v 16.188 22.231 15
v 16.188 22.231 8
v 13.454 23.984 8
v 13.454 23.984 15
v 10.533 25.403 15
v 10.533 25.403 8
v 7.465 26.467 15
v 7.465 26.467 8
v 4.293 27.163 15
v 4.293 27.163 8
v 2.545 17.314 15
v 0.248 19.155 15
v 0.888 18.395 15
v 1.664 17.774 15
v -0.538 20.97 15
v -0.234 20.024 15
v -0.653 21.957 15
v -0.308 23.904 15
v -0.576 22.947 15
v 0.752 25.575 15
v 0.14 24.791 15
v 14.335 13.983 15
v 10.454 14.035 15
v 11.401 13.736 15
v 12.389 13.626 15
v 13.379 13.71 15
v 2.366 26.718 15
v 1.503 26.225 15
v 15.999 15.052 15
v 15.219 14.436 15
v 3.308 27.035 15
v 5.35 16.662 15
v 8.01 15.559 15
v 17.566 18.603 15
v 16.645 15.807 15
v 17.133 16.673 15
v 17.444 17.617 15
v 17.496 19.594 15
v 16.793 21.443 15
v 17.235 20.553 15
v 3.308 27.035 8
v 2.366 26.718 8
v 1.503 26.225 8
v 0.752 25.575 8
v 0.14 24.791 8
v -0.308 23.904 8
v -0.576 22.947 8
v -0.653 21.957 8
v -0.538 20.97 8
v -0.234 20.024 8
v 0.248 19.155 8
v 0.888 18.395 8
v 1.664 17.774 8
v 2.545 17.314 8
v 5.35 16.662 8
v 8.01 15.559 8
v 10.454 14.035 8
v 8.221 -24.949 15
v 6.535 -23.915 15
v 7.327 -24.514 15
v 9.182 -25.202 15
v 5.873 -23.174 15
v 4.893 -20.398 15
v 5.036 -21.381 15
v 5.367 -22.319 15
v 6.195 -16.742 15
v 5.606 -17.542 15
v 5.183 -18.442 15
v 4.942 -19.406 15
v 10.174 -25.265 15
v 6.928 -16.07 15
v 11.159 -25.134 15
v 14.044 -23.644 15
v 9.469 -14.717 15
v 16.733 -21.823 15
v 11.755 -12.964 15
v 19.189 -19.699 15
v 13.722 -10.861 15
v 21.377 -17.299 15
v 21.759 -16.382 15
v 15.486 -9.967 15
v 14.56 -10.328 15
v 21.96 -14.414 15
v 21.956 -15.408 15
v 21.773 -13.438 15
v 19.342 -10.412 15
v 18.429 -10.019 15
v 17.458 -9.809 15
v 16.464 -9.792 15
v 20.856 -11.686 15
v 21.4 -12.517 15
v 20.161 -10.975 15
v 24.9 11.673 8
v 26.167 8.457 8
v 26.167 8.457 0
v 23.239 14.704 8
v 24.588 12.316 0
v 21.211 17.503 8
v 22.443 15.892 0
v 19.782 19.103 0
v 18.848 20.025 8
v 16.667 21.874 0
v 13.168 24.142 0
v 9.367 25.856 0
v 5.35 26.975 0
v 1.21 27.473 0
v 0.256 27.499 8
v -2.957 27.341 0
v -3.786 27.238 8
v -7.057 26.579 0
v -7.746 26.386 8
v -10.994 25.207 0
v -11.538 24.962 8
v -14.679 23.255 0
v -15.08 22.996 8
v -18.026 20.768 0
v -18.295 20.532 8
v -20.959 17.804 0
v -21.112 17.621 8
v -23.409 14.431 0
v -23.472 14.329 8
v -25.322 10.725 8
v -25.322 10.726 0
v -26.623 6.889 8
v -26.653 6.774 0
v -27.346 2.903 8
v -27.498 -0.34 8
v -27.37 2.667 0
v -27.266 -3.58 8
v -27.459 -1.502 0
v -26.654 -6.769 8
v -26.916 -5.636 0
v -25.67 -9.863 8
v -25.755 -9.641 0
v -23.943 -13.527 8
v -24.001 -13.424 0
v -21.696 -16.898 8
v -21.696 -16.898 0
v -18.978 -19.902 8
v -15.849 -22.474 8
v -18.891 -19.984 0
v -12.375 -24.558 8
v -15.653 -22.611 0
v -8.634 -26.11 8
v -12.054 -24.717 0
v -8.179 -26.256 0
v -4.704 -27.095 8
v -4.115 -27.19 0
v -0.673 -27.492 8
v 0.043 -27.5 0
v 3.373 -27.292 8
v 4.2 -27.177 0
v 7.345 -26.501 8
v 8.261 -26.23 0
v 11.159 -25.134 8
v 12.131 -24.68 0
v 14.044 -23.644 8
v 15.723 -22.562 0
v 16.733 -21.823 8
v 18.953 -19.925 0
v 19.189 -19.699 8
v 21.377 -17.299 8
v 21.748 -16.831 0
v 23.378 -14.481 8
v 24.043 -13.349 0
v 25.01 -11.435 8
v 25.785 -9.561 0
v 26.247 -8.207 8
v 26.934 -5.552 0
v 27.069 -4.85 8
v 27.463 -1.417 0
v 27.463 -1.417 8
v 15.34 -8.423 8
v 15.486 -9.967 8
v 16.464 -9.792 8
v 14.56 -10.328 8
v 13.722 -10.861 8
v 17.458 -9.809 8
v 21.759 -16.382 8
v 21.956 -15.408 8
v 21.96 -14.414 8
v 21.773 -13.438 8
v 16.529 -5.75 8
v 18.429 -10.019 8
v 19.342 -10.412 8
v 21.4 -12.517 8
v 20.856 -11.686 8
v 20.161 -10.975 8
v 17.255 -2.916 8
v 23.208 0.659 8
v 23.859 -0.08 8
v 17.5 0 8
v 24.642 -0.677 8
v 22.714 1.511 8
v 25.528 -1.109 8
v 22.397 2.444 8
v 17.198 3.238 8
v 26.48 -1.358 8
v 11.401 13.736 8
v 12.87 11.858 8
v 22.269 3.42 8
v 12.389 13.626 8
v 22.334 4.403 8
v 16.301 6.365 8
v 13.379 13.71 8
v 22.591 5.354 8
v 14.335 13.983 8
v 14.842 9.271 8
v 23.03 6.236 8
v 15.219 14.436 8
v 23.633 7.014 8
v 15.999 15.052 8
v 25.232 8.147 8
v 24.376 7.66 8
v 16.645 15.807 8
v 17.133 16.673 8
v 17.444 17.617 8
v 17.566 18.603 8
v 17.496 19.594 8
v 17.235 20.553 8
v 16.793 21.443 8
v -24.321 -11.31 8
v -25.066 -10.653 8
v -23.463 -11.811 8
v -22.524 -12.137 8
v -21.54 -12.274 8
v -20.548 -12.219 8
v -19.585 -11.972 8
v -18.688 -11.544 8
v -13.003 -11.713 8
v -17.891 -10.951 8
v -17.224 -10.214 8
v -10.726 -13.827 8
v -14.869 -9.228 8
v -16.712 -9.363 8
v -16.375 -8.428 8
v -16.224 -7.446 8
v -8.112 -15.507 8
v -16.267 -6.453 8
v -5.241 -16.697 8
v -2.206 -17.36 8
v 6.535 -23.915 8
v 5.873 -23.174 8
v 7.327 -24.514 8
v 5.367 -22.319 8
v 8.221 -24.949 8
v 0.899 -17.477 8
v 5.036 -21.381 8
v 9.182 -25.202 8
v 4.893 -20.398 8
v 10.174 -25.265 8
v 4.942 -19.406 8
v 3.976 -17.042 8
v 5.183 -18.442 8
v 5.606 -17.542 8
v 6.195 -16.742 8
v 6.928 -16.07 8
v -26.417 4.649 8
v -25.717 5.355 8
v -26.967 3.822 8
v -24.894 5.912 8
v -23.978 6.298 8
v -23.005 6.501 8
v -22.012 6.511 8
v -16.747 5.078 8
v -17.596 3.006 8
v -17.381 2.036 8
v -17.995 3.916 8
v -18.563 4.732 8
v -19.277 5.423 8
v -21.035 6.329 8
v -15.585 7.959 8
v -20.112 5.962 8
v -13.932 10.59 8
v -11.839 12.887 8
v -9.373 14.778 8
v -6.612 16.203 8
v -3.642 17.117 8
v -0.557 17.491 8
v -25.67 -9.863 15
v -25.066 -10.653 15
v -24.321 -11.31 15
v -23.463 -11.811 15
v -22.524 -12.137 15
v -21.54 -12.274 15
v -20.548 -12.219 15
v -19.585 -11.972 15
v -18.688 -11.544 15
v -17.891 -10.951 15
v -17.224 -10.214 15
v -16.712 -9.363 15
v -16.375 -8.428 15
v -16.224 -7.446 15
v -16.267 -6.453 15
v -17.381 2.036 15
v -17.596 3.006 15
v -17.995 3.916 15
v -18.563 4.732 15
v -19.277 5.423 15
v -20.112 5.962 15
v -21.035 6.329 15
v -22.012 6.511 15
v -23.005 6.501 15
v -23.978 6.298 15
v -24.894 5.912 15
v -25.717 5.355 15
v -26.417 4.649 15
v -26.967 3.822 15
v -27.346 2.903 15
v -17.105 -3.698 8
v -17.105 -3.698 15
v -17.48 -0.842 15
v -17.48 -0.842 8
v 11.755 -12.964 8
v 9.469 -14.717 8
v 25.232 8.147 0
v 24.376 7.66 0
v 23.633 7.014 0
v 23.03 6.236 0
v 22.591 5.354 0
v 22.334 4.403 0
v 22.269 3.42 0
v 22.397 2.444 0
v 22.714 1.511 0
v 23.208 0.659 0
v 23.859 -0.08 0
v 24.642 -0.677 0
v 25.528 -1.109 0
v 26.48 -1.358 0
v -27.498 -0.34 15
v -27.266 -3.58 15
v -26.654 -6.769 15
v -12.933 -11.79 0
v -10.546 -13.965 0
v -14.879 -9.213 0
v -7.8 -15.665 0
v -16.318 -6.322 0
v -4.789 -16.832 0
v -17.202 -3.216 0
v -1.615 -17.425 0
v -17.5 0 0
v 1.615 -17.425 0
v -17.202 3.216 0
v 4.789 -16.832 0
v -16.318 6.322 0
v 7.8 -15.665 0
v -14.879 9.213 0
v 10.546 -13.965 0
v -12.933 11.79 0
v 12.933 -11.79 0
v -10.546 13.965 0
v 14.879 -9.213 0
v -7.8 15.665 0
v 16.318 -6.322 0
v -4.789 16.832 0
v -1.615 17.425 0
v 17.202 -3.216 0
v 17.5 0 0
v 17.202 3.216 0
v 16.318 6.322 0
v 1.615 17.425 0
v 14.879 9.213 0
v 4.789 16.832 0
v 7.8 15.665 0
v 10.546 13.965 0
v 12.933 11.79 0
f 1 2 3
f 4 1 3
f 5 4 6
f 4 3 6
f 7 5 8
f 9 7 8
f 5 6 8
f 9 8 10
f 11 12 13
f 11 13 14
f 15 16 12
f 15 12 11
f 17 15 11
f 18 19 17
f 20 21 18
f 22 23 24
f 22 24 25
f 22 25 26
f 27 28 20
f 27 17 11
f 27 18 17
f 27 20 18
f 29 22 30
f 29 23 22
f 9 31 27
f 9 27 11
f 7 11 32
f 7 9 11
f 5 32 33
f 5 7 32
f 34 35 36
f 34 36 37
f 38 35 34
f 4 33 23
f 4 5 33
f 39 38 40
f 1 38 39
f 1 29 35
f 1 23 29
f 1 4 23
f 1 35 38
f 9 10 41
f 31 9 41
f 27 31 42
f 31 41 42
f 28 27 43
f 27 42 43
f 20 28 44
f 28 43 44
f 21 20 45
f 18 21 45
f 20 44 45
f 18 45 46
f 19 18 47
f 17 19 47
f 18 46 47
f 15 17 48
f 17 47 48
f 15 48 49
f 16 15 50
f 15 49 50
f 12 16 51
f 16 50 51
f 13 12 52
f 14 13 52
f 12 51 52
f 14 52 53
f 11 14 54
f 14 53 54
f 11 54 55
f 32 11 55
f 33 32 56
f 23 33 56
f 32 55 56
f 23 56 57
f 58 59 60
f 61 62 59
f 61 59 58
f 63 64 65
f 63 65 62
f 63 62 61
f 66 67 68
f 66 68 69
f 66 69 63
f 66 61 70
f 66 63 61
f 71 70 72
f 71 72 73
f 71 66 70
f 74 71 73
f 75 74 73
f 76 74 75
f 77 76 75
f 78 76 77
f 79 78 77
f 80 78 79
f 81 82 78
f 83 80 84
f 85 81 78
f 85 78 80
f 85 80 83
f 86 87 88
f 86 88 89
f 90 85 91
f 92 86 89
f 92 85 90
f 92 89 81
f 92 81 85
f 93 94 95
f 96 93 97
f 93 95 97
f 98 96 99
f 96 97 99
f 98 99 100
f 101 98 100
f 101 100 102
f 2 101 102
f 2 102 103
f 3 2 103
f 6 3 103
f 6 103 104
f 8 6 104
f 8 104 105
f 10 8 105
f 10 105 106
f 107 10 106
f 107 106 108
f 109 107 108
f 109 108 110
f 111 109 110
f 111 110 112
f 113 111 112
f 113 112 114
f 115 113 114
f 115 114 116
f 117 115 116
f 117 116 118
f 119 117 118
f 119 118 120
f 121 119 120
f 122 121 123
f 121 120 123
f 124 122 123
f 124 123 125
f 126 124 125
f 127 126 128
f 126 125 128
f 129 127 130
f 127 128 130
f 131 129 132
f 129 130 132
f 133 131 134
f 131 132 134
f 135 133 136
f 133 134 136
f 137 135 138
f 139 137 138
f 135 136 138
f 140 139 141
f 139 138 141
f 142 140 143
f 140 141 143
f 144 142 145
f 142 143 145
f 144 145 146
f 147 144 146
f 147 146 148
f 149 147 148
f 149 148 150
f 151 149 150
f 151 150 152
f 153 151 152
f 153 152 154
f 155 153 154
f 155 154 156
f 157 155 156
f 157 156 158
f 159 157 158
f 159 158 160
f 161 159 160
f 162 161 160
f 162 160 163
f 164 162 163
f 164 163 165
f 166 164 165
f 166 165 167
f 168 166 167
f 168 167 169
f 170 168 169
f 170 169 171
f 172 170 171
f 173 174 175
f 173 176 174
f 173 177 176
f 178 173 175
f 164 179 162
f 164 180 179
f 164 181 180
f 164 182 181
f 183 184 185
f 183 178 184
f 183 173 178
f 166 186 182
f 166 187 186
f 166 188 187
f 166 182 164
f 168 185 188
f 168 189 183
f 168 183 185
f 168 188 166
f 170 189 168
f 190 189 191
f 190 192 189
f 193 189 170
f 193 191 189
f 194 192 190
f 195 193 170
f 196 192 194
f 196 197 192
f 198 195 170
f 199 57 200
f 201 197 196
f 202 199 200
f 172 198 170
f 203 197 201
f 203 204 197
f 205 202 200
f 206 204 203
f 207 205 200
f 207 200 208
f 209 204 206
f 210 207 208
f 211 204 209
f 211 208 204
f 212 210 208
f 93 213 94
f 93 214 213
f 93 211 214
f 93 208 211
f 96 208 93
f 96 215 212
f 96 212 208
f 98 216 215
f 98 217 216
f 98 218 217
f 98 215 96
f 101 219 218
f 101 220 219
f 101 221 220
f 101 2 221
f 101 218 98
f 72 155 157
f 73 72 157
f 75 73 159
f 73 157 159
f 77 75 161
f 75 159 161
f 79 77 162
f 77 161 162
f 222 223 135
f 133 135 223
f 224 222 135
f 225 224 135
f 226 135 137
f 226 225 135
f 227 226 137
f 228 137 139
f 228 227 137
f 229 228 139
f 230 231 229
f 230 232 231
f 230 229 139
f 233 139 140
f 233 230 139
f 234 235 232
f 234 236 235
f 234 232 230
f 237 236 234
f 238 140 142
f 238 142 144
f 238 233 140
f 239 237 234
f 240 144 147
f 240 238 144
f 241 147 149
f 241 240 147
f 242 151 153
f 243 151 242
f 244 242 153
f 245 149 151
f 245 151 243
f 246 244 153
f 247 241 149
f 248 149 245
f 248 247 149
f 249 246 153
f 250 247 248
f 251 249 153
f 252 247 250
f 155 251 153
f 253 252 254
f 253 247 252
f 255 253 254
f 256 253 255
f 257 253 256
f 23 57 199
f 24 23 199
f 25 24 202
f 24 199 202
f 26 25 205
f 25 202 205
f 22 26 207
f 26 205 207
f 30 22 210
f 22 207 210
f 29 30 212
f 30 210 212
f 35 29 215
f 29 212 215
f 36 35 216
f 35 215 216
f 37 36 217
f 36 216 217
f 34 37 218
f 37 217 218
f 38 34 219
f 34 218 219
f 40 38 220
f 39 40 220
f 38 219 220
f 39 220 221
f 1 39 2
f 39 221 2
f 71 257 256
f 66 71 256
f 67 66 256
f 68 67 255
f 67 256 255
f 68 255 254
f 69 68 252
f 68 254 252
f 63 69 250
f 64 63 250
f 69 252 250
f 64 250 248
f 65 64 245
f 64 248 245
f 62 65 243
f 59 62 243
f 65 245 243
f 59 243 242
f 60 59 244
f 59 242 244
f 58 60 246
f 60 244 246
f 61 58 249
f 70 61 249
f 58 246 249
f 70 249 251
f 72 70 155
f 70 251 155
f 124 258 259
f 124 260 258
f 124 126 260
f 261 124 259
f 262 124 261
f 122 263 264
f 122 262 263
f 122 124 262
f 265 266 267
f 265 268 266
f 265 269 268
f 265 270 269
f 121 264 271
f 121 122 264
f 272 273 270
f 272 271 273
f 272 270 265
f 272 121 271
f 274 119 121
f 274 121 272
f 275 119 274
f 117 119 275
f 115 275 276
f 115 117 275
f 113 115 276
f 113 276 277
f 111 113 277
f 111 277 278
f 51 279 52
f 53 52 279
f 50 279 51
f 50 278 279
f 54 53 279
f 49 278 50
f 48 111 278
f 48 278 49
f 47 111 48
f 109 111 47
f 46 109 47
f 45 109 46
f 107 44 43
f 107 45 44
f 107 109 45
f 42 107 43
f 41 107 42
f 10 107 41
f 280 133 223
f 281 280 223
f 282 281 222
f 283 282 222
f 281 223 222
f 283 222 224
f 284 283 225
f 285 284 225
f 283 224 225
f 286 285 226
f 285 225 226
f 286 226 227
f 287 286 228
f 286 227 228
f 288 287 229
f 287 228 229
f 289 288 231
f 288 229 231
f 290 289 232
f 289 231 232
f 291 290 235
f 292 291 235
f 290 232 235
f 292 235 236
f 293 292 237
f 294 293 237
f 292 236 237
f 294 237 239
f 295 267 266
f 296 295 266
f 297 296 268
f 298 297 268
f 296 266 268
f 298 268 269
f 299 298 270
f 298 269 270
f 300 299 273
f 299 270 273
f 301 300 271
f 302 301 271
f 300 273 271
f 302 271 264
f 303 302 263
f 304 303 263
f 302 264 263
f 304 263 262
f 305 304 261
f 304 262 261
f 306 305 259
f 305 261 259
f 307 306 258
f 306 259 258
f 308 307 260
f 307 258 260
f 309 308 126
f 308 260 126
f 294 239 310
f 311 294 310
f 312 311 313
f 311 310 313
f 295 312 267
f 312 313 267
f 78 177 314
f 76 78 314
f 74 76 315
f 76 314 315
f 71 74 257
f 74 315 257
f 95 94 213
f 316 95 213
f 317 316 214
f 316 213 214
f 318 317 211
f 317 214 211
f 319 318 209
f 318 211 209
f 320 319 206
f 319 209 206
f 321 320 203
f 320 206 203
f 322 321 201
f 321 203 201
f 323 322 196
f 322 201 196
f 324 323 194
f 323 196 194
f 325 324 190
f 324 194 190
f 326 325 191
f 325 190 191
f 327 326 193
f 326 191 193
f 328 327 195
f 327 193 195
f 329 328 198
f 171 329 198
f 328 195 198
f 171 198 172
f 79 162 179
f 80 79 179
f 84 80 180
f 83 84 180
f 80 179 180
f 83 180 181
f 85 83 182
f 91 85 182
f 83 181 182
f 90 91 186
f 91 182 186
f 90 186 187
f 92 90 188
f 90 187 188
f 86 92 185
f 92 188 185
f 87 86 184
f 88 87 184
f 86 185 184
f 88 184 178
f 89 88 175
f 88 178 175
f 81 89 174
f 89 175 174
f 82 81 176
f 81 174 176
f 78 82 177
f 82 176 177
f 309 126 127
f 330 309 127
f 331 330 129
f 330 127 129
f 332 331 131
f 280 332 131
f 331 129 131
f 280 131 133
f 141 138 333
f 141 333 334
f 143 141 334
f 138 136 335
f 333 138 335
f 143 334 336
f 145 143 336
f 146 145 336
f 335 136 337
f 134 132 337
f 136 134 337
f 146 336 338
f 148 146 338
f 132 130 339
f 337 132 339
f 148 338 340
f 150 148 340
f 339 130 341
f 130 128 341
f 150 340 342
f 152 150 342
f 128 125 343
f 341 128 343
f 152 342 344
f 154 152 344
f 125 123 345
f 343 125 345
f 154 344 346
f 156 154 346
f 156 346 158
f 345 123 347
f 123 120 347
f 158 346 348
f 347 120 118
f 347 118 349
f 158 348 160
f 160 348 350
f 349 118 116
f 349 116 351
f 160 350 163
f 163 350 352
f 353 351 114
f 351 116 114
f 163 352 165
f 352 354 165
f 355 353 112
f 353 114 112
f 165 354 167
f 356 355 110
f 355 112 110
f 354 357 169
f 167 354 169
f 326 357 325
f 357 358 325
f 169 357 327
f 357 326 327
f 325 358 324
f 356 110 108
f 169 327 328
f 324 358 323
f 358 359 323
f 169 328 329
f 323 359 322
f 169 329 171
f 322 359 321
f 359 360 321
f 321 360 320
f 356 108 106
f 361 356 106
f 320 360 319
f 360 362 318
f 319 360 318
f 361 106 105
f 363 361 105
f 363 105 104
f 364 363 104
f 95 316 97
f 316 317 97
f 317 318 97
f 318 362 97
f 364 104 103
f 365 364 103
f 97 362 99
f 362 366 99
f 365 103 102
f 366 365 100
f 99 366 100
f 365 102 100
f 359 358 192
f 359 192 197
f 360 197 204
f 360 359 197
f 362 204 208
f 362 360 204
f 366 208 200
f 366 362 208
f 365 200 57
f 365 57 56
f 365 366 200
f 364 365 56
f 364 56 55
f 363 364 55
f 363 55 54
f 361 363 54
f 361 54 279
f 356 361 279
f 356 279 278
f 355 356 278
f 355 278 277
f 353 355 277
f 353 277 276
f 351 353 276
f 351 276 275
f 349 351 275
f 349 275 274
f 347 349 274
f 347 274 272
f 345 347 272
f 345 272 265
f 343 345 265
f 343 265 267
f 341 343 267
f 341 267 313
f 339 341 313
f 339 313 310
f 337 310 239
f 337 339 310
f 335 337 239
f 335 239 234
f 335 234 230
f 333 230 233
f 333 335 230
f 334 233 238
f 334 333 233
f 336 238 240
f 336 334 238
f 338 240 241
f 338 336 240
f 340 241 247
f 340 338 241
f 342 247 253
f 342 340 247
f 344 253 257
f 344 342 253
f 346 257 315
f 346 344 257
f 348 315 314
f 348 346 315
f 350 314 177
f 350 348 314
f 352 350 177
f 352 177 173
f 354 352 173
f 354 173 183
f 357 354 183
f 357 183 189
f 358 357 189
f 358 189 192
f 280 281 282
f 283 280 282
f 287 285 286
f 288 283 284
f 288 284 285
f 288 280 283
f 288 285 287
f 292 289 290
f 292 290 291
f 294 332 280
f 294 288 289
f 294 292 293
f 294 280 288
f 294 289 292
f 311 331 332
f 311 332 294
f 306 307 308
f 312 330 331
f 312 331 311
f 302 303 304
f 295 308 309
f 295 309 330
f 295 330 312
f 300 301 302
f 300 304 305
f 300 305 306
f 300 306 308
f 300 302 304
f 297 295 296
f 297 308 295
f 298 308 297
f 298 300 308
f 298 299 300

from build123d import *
from build123d.topology import SkipClean

# Parameters (mm, degrees)
SKETCH1_R           = 27.5
SKETCH1_R_2         = 17.5
BOSS_EXTRUDE1_DEPTH = 8
BOSS_EXTRUDE2_DEPTH = 7
SKETCH4_R           = 5
CUT_EXTRUDE1_DEPTH  = 40.705163392


with BuildPart() as part:
    # Sketch1 → Boss-Extrude1 (new body)
    with BuildSketch(Plane.XY):
        Circle(SKETCH1_R)
        Circle(SKETCH1_R_2, mode=Mode.SUBTRACT)
    extrude(amount=BOSS_EXTRUDE1_DEPTH)

    # Sketch2 → Boss-Extrude2 (add)
    with SkipClean():  # the faces are left unmerged after this step: merging them gives an invalid solid
        with BuildSketch(Plane.XY.offset(8)):
            with BuildLine():
                ThreePointArc((10.453586197, 14.034690435), (16.644995589, 15.807064972), (16.187563711, 22.230896993))
                ThreePointArc((16.187563711, 22.230896993), (10.533073102, 25.40284179), (4.293124723, 27.162825334))
                ThreePointArc((4.293124723, 27.162825334), (-0.575744113, 22.947498772), (2.54487111, 17.313972133))
                ThreePointArc((2.54487111, 17.313972133), (6.702864701, 16.165444776), (10.453586197, 14.034690435))
            make_face()
            with BuildLine():
                ThreePointArc((-17.38119155, 2.03572599), (-22.011817619, 6.51145654), (-27.3463034, 2.903392903))
                ThreePointArc((-27.3463034, 2.903392903), (-27.26604287, -3.579512009), (-25.670259139, -9.863457595))
                ThreePointArc((-25.670259139, -9.863457595), (-19.585244834, -11.972358414), (-16.266775263, -6.453063036))
                ThreePointArc((-16.266775263, -6.453063036), (-17.35111819, -2.277871278), (-17.38119155, 2.03572599))
            make_face()
            with BuildLine():
                ThreePointArc((21.377134416, -17.299367738), (20.160988946, -10.975140359), (13.721904153, -10.860909097))
                ThreePointArc((13.721904153, -10.860909097), (10.648253489, -13.887573497), (6.927605353, -16.070416425))
                ThreePointArc((6.927605353, -16.070416425), (5.36682203, -22.318521512), (11.158739689, -25.134289896))
                ThreePointArc((11.158739689, -25.134289896), (16.732969768, -21.823329781), (21.377134416, -17.299367738))
            make_face()
        extrude(amount=BOSS_EXTRUDE2_DEPTH)

    # Sketch4 → Cut-Extrude1 (cut, through all)
    with SkipClean():  # the faces are left unmerged after this step: merging them gives an invalid solid
        with BuildSketch(Plane.XY.offset(8)):
            with Locations((27.26604287, 3.579512009)):
                Circle(SKETCH4_R)
        extrude(amount=-CUT_EXTRUDE1_DEPTH, mode=Mode.SUBTRACT)


solid = part.part
